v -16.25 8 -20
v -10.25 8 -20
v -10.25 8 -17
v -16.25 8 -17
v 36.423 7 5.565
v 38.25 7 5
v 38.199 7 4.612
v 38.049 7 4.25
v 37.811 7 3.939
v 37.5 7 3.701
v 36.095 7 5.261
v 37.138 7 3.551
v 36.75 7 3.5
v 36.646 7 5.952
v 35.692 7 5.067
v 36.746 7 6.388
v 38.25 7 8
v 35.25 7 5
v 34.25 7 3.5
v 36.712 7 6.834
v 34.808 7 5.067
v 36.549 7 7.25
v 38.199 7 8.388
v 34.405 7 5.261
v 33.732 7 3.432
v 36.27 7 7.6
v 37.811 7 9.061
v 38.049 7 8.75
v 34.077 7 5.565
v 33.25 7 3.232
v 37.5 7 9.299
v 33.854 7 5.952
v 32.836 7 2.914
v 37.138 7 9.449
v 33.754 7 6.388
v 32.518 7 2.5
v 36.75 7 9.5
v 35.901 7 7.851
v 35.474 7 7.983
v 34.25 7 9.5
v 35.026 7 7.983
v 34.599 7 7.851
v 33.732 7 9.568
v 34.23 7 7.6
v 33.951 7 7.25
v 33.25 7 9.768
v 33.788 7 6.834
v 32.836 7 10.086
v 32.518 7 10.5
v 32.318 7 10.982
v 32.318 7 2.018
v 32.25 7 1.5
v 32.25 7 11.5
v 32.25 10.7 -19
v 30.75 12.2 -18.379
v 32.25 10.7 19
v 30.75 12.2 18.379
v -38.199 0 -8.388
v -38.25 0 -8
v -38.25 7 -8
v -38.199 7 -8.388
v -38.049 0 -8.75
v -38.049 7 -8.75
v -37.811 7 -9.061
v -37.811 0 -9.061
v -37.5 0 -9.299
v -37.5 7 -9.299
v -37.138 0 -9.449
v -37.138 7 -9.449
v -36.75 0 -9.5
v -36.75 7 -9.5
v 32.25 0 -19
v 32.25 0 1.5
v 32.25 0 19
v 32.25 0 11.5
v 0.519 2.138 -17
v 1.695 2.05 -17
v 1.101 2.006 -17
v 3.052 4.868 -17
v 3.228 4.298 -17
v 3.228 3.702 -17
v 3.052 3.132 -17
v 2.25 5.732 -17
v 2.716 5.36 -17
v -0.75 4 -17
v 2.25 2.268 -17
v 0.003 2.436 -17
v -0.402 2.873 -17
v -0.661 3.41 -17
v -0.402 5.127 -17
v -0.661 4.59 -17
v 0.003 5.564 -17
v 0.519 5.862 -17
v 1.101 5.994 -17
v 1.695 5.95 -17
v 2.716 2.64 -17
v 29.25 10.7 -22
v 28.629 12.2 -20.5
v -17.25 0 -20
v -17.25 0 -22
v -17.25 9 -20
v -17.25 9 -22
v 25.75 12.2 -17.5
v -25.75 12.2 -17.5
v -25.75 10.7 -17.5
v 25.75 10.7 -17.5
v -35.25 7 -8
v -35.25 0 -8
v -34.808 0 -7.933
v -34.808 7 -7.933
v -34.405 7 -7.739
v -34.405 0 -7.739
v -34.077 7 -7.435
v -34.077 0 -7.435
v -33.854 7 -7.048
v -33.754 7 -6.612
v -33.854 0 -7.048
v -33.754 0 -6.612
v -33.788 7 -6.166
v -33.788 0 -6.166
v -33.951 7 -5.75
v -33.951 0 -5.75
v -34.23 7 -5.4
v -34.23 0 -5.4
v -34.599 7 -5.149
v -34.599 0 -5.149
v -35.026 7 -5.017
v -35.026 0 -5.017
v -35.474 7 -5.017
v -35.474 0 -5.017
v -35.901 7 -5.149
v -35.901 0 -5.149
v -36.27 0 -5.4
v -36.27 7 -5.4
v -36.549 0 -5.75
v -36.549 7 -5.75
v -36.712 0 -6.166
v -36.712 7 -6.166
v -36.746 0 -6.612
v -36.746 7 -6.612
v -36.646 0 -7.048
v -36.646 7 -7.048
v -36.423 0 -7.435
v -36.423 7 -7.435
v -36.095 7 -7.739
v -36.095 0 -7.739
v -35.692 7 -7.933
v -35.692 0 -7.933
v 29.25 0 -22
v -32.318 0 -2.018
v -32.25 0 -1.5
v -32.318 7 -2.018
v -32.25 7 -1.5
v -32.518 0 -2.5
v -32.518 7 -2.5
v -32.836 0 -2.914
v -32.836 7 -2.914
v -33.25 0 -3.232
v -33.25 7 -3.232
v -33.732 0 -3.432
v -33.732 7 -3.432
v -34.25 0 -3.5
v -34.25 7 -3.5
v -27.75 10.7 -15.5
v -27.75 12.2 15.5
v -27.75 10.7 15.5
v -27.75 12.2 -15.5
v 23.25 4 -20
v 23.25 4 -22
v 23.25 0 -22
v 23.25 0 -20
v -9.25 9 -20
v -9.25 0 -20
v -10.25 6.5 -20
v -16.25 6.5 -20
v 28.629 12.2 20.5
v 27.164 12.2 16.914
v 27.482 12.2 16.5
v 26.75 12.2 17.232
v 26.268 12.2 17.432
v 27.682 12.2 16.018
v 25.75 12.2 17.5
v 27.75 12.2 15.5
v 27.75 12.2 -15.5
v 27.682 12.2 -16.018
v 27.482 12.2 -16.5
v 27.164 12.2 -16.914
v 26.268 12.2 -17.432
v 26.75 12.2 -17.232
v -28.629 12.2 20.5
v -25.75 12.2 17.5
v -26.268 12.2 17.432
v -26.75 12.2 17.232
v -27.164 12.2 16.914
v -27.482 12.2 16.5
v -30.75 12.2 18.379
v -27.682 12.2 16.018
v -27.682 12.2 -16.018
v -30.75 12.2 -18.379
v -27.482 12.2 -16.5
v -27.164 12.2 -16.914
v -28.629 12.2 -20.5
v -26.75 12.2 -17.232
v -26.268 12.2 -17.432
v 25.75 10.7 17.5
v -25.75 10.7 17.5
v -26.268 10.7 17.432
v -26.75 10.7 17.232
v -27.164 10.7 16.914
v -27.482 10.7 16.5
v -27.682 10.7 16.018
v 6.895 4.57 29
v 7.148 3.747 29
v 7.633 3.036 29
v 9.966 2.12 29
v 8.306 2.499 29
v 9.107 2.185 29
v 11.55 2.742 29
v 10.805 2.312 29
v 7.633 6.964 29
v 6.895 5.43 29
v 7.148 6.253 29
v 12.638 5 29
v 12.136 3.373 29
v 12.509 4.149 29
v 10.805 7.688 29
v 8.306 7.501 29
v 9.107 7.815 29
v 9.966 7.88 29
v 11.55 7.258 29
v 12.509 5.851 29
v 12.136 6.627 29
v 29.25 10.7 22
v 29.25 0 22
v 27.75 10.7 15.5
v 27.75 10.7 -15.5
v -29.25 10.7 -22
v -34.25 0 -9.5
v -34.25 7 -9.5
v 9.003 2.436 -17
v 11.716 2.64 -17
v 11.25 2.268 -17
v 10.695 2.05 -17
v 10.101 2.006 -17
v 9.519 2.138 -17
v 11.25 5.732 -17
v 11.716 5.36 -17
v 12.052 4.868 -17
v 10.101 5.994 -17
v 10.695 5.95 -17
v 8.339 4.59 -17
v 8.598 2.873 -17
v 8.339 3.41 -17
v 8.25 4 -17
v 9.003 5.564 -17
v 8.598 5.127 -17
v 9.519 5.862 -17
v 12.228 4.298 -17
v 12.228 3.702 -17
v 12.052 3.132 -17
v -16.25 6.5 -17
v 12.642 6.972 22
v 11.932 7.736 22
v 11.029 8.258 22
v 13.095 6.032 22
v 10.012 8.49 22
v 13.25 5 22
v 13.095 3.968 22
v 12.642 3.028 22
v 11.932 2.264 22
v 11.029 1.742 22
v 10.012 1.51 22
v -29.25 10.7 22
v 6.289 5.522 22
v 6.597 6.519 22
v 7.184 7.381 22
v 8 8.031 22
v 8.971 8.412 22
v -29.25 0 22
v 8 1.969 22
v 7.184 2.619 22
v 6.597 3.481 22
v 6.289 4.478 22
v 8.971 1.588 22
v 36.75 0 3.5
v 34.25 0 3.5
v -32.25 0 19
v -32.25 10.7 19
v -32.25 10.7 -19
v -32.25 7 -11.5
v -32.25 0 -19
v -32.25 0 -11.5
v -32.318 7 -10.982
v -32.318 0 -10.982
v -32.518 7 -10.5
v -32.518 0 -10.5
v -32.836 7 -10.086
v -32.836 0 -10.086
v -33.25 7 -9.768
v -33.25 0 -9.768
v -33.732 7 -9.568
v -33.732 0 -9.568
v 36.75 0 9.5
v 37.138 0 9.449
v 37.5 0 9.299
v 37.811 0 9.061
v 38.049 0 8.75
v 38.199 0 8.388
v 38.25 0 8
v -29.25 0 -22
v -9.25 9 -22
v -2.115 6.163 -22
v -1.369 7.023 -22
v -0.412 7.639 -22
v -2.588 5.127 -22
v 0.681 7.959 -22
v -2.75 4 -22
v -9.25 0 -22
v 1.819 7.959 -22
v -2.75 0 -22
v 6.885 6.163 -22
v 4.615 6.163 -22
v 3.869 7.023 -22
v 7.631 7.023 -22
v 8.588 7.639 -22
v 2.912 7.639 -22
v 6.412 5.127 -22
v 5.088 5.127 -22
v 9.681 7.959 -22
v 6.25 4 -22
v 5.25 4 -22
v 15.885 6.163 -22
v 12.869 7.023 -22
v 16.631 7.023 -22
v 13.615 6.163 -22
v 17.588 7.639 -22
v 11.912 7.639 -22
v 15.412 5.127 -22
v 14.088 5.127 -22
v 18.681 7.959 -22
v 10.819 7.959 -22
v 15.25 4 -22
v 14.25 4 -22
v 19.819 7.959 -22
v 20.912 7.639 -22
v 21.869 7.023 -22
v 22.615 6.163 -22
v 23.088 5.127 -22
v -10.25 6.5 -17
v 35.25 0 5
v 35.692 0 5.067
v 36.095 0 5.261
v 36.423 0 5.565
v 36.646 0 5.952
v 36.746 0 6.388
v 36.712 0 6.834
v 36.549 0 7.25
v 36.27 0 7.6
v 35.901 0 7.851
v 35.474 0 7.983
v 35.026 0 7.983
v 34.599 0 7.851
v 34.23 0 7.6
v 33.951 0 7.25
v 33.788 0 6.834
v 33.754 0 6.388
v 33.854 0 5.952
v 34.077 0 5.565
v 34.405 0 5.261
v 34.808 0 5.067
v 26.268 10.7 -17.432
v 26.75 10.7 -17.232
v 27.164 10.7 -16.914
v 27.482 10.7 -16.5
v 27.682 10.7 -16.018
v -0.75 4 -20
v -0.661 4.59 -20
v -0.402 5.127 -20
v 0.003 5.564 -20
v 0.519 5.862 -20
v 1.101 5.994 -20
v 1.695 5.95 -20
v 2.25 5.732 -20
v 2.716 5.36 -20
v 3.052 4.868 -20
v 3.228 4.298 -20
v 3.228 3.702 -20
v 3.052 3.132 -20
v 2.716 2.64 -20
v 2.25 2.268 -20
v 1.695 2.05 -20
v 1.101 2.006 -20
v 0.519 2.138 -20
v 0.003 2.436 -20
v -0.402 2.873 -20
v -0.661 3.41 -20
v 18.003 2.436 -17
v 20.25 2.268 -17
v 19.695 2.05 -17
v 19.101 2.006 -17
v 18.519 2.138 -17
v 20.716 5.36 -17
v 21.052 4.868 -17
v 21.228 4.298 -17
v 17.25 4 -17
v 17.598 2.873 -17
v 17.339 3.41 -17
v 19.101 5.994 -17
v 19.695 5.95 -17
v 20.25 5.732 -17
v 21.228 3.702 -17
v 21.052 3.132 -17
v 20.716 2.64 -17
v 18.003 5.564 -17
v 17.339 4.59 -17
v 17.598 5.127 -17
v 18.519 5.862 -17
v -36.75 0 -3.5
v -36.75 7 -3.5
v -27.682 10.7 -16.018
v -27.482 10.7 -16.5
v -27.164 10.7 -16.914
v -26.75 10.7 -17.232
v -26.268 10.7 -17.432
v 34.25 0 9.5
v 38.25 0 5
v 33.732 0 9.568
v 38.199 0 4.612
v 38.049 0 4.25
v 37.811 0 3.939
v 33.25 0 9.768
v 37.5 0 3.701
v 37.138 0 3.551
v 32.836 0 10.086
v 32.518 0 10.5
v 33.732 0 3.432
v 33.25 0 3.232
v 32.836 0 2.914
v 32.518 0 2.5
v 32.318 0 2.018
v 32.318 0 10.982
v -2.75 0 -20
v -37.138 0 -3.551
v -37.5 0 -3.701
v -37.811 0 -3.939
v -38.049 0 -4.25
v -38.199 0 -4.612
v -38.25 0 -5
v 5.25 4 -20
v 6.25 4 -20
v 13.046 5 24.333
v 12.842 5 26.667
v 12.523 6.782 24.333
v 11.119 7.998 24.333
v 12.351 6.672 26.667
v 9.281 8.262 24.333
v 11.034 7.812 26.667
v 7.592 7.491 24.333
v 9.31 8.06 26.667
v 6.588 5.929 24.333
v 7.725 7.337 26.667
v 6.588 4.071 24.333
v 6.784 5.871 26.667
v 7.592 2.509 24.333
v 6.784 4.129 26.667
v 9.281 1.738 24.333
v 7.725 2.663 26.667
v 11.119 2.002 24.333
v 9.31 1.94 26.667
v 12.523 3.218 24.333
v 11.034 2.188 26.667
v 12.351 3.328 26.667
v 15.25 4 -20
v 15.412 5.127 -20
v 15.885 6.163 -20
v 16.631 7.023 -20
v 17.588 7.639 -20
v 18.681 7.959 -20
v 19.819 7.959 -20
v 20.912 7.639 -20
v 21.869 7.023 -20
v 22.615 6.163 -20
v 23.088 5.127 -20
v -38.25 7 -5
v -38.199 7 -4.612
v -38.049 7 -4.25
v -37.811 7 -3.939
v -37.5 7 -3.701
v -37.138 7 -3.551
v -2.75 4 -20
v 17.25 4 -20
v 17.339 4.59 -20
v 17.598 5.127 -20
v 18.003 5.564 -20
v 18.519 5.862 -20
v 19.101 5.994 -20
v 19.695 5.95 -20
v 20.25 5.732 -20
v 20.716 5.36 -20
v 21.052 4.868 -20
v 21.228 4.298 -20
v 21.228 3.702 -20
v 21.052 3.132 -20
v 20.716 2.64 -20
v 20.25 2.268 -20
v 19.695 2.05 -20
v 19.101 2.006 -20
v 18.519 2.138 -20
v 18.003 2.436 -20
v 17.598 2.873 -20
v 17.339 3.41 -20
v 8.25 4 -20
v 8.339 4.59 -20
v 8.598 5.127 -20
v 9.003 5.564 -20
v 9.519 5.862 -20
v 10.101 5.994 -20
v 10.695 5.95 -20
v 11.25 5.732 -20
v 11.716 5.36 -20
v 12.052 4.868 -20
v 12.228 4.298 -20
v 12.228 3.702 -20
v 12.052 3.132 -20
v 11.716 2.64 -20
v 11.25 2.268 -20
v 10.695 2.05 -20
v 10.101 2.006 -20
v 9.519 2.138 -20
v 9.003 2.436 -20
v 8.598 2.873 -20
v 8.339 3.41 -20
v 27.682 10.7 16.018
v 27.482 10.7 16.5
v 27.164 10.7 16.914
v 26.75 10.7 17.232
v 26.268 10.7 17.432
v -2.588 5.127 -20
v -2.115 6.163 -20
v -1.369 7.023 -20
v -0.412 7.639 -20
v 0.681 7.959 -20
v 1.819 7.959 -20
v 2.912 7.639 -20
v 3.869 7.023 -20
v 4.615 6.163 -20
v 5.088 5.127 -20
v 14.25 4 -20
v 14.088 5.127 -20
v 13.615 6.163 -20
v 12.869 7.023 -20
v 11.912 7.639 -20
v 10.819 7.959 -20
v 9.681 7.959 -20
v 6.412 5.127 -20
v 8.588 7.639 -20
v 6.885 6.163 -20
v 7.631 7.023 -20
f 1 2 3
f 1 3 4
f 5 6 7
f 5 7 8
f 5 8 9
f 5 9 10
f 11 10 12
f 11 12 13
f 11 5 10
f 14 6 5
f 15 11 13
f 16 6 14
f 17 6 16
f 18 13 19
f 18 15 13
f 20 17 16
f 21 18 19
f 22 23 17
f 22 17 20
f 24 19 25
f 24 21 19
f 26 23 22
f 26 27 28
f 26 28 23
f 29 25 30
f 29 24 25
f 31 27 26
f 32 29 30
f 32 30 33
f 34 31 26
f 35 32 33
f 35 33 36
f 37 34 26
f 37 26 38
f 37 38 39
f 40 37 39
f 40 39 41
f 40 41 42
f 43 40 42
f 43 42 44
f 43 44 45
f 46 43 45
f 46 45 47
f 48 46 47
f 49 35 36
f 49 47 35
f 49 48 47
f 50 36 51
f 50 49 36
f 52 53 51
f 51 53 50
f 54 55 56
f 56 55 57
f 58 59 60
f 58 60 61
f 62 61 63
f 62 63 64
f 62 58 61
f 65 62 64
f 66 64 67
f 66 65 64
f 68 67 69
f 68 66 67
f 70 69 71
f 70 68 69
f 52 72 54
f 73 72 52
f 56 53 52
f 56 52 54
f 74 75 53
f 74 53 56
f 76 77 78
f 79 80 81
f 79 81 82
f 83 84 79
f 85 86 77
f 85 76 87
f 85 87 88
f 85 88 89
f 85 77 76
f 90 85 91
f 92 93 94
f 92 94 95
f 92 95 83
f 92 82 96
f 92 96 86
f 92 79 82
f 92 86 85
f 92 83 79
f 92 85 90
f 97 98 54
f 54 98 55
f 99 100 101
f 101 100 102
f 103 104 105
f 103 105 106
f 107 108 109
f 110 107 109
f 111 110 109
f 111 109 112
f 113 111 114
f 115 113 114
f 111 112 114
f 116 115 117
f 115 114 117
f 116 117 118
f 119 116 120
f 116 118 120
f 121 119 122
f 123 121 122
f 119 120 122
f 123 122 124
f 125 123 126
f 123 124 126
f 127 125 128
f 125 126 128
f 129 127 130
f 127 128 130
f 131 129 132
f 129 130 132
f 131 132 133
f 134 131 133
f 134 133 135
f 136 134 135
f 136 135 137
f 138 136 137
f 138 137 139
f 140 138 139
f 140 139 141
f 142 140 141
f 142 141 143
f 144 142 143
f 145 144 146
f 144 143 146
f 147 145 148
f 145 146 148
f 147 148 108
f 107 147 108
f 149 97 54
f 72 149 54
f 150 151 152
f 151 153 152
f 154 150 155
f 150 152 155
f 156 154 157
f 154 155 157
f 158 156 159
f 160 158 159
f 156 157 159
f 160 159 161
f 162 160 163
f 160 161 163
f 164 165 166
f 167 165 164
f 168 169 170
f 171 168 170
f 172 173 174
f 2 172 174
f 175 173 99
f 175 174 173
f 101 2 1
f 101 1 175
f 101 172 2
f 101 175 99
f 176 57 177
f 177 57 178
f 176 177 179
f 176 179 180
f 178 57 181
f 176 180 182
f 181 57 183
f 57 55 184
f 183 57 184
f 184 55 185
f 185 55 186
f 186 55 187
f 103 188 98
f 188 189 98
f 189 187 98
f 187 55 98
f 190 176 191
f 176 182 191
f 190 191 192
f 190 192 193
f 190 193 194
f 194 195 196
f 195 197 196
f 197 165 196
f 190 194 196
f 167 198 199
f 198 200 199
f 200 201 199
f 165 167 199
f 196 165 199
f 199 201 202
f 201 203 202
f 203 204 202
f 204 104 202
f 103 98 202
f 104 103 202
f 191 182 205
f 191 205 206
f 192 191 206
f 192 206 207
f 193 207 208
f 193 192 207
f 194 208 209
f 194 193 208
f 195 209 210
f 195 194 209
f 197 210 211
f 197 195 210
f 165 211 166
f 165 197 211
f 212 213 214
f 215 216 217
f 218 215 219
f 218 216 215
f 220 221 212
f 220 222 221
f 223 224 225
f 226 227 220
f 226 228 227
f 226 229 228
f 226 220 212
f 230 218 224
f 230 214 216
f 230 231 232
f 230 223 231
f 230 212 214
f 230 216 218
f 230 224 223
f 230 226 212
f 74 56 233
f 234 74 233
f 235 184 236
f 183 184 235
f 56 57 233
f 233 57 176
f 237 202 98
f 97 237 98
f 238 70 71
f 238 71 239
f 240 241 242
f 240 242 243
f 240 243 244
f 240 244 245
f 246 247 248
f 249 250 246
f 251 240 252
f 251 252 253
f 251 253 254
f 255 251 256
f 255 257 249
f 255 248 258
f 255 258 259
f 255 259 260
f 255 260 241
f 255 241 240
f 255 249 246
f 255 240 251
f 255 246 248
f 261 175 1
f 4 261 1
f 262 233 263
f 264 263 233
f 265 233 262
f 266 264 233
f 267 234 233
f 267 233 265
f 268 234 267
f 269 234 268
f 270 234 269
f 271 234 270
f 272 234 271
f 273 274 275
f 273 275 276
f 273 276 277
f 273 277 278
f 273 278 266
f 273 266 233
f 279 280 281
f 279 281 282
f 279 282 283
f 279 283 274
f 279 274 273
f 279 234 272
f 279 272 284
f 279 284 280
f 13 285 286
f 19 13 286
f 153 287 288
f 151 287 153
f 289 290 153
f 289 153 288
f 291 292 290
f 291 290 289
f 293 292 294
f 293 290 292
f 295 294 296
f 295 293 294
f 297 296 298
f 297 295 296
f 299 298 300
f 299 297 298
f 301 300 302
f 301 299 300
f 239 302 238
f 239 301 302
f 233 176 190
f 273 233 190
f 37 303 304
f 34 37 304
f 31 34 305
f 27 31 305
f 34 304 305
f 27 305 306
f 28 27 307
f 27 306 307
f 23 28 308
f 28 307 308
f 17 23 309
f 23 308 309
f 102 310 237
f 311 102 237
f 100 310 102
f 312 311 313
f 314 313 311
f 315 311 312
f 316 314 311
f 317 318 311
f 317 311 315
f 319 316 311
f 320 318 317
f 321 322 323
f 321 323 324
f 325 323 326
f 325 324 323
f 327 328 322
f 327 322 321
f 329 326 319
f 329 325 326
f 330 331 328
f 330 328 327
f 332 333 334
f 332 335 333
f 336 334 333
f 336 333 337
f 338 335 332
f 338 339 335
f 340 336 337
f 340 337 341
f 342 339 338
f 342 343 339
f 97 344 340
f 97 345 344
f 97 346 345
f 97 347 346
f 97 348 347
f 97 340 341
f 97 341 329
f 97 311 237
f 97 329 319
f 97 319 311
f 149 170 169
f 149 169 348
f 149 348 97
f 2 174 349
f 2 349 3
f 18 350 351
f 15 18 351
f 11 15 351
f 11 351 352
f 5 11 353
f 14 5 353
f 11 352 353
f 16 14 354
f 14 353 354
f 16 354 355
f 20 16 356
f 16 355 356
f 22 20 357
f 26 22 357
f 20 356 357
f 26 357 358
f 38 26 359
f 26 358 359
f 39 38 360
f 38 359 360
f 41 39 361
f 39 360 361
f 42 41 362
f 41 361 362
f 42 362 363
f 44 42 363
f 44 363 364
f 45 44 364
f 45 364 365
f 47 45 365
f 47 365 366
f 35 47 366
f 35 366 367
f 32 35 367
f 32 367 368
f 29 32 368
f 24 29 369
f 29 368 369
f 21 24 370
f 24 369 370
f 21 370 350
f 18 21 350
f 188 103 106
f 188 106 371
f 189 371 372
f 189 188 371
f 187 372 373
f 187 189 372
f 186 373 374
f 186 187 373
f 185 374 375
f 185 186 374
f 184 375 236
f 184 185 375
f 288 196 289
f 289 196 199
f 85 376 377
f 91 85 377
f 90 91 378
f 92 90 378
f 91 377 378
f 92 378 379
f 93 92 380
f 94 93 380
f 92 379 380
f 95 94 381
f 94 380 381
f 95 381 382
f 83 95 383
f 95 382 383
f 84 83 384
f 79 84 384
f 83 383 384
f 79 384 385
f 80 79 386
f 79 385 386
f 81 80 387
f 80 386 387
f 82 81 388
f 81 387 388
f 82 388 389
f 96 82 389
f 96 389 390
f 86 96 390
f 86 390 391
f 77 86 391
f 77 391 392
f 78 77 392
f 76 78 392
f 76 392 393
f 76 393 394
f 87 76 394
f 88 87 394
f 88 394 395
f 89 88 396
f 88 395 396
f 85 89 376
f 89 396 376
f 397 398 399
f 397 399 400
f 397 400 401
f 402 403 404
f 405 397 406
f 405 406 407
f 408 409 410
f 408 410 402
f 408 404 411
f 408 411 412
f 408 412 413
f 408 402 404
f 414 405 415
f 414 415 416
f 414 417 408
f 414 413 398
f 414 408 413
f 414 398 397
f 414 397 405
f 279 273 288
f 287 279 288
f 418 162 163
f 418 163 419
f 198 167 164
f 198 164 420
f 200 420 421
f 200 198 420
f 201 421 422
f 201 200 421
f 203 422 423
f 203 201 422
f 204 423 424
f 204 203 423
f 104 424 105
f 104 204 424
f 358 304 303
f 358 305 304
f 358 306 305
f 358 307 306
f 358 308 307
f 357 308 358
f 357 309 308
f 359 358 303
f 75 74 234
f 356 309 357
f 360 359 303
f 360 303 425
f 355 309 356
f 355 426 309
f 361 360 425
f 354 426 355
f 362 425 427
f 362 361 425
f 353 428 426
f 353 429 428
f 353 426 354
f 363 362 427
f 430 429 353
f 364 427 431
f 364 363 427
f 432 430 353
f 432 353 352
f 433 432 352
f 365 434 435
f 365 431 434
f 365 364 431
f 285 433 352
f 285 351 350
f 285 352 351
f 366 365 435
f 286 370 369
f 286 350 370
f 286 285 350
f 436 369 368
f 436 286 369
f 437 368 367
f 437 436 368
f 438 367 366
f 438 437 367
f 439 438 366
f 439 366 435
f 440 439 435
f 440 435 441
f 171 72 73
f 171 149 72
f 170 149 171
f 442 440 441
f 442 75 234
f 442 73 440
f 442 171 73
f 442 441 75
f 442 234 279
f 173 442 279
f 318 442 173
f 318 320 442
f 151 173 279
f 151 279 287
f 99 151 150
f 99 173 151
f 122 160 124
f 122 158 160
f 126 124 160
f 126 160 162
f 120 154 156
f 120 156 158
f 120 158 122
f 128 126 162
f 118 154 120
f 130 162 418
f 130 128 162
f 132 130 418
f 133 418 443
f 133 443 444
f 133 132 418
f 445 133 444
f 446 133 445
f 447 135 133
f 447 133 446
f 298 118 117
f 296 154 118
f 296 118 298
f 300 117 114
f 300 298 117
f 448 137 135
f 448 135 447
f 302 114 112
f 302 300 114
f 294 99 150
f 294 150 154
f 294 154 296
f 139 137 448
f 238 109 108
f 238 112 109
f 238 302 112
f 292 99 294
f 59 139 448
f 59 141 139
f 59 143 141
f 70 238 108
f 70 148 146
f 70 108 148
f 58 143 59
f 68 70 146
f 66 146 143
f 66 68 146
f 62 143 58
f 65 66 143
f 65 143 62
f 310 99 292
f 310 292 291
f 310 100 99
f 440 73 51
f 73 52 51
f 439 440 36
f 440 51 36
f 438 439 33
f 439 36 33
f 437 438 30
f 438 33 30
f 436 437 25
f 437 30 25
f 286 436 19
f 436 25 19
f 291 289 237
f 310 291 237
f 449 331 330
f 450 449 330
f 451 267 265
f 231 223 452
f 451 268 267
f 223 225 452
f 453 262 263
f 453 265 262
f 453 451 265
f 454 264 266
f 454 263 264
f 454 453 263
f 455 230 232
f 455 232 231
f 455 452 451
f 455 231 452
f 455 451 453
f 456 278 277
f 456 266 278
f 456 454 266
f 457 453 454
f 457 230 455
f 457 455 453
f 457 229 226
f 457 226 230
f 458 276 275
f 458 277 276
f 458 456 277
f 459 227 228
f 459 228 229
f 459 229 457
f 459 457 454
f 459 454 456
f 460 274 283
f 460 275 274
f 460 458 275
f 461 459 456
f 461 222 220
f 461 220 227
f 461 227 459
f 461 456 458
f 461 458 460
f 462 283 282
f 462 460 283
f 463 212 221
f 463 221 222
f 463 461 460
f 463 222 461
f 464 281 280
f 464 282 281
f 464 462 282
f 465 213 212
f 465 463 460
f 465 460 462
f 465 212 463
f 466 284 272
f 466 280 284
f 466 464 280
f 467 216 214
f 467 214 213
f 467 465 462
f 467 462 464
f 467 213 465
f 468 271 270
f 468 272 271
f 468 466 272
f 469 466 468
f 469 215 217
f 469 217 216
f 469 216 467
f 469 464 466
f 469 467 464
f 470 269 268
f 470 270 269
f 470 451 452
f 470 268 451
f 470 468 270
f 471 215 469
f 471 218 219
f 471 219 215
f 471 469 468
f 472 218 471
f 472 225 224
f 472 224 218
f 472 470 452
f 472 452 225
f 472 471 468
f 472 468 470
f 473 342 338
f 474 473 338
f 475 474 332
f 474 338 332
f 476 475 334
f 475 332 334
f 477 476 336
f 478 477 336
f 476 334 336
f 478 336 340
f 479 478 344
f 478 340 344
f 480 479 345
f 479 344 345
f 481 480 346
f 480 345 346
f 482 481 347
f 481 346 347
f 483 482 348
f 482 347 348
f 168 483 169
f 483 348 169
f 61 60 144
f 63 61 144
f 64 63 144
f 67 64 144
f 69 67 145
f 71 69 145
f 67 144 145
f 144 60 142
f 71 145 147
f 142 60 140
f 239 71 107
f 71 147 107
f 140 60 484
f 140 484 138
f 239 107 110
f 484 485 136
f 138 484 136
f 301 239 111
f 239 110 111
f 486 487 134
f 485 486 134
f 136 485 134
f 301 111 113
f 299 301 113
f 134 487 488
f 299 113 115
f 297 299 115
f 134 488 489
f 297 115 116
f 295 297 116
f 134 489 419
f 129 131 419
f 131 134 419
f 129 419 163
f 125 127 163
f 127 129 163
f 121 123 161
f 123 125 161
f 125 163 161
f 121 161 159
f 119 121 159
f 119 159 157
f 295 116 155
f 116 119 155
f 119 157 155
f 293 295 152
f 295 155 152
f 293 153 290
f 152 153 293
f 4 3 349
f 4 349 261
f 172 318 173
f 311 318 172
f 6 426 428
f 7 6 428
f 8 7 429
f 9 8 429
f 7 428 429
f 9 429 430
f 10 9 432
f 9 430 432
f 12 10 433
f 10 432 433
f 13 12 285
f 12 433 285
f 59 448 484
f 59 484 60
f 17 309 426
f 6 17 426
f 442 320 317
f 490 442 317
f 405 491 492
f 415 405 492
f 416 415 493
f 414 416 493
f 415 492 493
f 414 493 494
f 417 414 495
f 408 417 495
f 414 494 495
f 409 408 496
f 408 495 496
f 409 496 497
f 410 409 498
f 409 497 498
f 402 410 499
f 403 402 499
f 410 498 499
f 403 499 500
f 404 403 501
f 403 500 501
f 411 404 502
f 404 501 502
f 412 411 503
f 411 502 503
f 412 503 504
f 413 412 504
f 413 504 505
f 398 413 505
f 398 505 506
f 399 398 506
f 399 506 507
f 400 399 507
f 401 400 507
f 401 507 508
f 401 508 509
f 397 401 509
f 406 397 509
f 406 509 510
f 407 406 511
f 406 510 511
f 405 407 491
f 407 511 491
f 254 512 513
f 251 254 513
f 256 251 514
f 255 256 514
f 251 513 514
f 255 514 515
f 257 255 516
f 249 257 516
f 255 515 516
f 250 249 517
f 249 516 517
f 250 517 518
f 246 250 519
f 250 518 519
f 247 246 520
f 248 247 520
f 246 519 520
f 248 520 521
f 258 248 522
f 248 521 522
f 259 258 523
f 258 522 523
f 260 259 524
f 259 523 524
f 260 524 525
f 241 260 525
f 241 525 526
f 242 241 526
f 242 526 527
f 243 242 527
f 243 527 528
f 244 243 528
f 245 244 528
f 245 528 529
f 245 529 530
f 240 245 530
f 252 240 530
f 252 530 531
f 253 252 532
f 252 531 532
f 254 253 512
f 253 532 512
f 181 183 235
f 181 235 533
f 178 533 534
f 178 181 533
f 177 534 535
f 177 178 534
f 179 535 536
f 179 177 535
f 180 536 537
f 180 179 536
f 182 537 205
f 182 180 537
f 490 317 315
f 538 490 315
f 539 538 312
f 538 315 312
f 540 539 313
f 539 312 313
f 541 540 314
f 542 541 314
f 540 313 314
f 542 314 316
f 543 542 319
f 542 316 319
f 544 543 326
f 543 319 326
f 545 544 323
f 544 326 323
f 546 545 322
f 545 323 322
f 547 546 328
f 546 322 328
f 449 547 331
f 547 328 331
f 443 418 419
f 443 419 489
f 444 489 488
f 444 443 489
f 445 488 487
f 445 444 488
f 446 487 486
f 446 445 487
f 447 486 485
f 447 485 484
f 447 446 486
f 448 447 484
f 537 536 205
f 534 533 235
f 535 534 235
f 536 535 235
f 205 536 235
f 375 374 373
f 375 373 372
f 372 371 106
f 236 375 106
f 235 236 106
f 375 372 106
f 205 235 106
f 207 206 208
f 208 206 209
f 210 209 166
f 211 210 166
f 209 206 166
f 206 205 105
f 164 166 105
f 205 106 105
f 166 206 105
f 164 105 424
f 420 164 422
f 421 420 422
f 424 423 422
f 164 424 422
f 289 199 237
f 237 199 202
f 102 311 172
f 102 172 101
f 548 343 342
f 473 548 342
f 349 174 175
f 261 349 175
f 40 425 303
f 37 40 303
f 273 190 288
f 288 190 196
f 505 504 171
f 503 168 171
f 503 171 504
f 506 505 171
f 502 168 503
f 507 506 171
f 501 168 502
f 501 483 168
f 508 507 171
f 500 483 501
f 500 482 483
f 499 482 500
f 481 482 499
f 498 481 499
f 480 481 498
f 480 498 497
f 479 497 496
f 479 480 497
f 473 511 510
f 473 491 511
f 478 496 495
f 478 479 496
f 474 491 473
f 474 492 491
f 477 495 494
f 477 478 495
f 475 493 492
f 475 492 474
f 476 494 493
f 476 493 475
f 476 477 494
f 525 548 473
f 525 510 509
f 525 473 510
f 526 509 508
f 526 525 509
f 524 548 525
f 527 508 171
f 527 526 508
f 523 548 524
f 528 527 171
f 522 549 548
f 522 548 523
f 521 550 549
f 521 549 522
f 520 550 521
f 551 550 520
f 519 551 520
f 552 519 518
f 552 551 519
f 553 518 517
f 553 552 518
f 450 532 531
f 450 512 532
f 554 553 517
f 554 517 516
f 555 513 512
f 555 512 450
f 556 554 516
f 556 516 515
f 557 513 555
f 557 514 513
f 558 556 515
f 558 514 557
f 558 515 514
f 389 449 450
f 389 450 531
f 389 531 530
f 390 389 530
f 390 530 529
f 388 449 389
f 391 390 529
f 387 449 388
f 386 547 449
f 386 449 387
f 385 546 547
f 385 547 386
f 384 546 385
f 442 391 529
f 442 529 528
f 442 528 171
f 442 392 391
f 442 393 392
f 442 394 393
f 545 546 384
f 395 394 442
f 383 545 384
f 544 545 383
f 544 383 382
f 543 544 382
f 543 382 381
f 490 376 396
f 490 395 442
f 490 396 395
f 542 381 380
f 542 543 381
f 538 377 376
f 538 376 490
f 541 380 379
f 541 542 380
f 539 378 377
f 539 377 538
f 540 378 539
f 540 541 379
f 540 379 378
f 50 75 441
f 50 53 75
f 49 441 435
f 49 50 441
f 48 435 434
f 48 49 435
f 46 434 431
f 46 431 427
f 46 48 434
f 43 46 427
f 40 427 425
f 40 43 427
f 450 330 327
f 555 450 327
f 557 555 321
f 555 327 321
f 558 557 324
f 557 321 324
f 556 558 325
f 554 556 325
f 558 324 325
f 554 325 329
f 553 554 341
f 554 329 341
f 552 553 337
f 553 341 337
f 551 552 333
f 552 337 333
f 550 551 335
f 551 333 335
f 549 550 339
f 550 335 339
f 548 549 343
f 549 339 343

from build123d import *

# Parameters (mm, degrees)
EXTRUDE_1_DEPTH     = 12.2
CHAMFER_1_SIZE      = 1.5
CUT_EXTRUDE_1_DEPTH = 1.5
SKETCH_3_R          = 1.5
EXTRUDE_2_DEPTH     = 7
FILLET_1_R          = 2
SKETCH_4_R          = 3.5
EXTRUDE_3_DEPTH     = 7
EXTRUDE_3_TAPER     = 5
SKETCH_5_W          = 8
SKETCH_5_H          = 9
CUT_EXTRUDE_2_DEPTH = 2
SKETCH_6_R          = 2
SKETCH_6_W          = 6
SKETCH_6_H          = 1.5
CUT_EXTRUDE_3_DEPTH = 3


with BuildPart() as part:
    # 草图1 → 凸台-拉伸1 (new body)
    with BuildSketch(Plane(origin=(0, 0, 0), x_dir=(1, 0, 0), z_dir=(0, 1, 0))):
        Polygon((-32.25, 19), (-29.25, 22), (29.25, 22), (32.25, 19), (32.25, -19), (29.25, -22), (-29.25, -22), (-32.25, -19), align=None)
    extrude(amount=EXTRUDE_1_DEPTH)

    # 倒角1
    chamfer_1_edges = [part.edges().sort_by_distance(p)[0] for p in [
        (0, 12.2, 22),
        (30.75, 12.2, 20.5),
        (32.25, 12.2, 0),
        (30.75, 12.2, -20.5),
        (0, 12.2, -22),
        (-30.75, 12.2, -20.5),
        (-32.25, 12.2, 0),
        (-30.75, 12.2, 20.5),
    ]]
    chamfer(chamfer_1_edges, length=CHAMFER_1_SIZE)

    # 草图2 → 切除-拉伸1 (cut)
    with BuildSketch(Plane(origin=(0, 12.2, 0), x_dir=(1, 0, 0), z_dir=(0, 1, 0))):
        with BuildLine():
            Line((-25.75, 17.5), (25.75, 17.5))
            ThreePointArc((25.75, 17.5), (27.164213562, 16.914213562), (27.75, 15.5))
            Line((27.75, 15.5), (27.75, -15.5))
            ThreePointArc((27.75, -15.5), (27.164213562, -16.914213562), (25.75, -17.5))
            Line((25.75, -17.5), (-25.75, -17.5))
            ThreePointArc((-25.75, -17.5), (-27.164213562, -16.914213562), (-27.75, -15.5))
            Line((-27.75, -15.5), (-27.75, 15.5))
            ThreePointArc((-27.75, 15.5), (-27.164213562, 16.914213562), (-25.75, 17.5))
        make_face()
    extrude(amount=-CUT_EXTRUDE_1_DEPTH, mode=Mode.SUBTRACT)

    # 草图3 → 凸台-拉伸2 (add)
    # profile 1 of 2: a face of its own
    with BuildSketch(Plane.XZ):
        with BuildLine():
            Line((32.25, 9.5), (36.75, 9.5))
            ThreePointArc((36.75, 9.5), (37.810660172, 9.060660172), (38.25, 8))
            Line((38.25, 8), (38.25, 5))
            ThreePointArc((38.25, 5), (37.810660172, 3.939339828), (36.75, 3.5))
            Line((36.75, 3.5), (32.25, 3.5))
            Line((32.25, 3.5), (32.25, 9.5))
        make_face()
        with Locations(Location((35.25, 6.5, 0), (0, 0, 270))):
            Circle(SKETCH_3_R, mode=Mode.SUBTRACT)
    # profile 2 of 2: a face of its own
    with BuildSketch(Plane.XZ):
        with BuildLine():
            Line((-32.25, -3.5), (-36.75, -3.5))
            ThreePointArc((-36.75, -3.5), (-37.810660172, -3.939339828), (-38.25, -5))
            Line((-38.25, -5), (-38.25, -8))
            ThreePointArc((-38.25, -8), (-37.810660172, -9.060660172), (-36.75, -9.5))
            Line((-36.75, -9.5), (-32.25, -9.5))
            Line((-32.25, -9.5), (-32.25, -3.5))
        make_face()
        with Locations(Location((-35.25, -6.5, 0), (0, 0, 270))):
            Circle(SKETCH_3_R, mode=Mode.SUBTRACT)
    extrude(amount=-EXTRUDE_2_DEPTH)

    # 圆角1
    fillet_1_edges = [part.edges().sort_by_distance(p)[0] for p in [
        (32.25, 3.5, 3.5),
        (32.25, 3.5, 9.5),
        (-32.25, 3.5, -3.5),
        (-32.25, 3.5, -9.5),
    ]]
    fillet(fillet_1_edges, radius=FILLET_1_R)

    # 草图4 → 凸台-拉伸3 (add)
    with BuildSketch(Plane.XY.offset(22)):
        with Locations((9.75, 5)):
            Circle(SKETCH_4_R)
    extrude(amount=EXTRUDE_3_DEPTH, taper=EXTRUDE_3_TAPER)

    # 草图5 → 切除-拉伸2 (cut)
    with BuildSketch(Plane(origin=(0, 0, -22), x_dir=(-1, 0, 0), z_dir=(0, 0, -1))):
        with BuildLine():
            Line((-23.25, 4), (-23.25, 0))
            Line((-23.25, 0), (2.75, 0))
            Line((2.75, 0), (2.75, 4))
            ThreePointArc((2.75, 4), (-1.25, 8), (-5.25, 4))
            Line((-5.25, 4), (-6.25, 4))
            ThreePointArc((-6.25, 4), (-10.25, 8), (-14.25, 4))
            Line((-14.25, 4), (-15.25, 4))
            ThreePointArc((-15.25, 4), (-19.25, 8), (-23.25, 4))
        make_face()
        with Locations((13.25, 4.5)):
            Rectangle(SKETCH_5_W, SKETCH_5_H)
    extrude(amount=-CUT_EXTRUDE_2_DEPTH, mode=Mode.SUBTRACT)

    # 草图6 → 切除-拉伸3 (cut)
    with BuildSketch(Plane(origin=(0, 0, -20), x_dir=(-1, 0, 0), z_dir=(0, 0, -1))):
        with Locations((-19.25, 4)):
            Circle(SKETCH_6_R)
        with Locations((-10.25, 4)):
            Circle(SKETCH_6_R)
        with Locations((-1.25, 4)):
            Circle(SKETCH_6_R)
        with Locations((13.25, 7.25)):
            Rectangle(SKETCH_6_W, SKETCH_6_H)
    extrude(amount=-CUT_EXTRUDE_3_DEPTH, mode=Mode.SUBTRACT)


solid = part.part
